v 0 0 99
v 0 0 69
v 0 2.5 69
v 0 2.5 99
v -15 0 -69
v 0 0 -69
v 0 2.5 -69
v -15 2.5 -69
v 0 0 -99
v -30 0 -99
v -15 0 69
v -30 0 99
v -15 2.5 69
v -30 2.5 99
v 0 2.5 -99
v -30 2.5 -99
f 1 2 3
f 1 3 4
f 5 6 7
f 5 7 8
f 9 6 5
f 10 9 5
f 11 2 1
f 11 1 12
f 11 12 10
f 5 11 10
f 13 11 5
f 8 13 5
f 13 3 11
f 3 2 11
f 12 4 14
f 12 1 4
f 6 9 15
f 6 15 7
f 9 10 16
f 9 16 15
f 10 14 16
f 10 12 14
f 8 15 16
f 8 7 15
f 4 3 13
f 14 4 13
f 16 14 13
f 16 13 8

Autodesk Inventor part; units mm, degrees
ref_plane "YZ Plane" through (0, 0, 0) normal (1, 0, 0) x (0, 1, 0)
ref_plane "XZ Plane" through (0, 0, 0) normal (0, 1, 0) x (-1, 0, 0)
ref_plane "XY Plane" through (0, 0, 0) normal (0, 0, 1) x (1, 0, 0)
sketch "スケッチ1" plane through (0, 0, 0) normal (0, 1, 0) x (-1, 0, 0)
  line L0 (0, 99) -> (30, 99)
  line L1 (30, 99) -> (30, -99)
  line L2 (30, -99) -> (0, -99)
  line L3 (0, -99) -> (0, 99)
  line L4 (0, -69) -> (15, -69)
  line L5 (15, -69) -> (15, 0)
  line L6 (36, 0) -> (-6, 0) projected
  line L7 (0, 69) -> (15, 69)
  line L8 (15, 69) -> (15, 0)
  point P0 (0, 0)
  point P1 (0, 0)
  dimension "d0" = 198
  dimension "d1" = 30
  dimension "d32" = 30
  dimension "d33" = 15
extrude "押し出し1" add sketch "スケッチ1" along normal blind 2.5 contours L0 L1 L6 L8 L7 L3 | L1 L2 L3 L4 L5 L6
properties part number "belt_rail" material "木材 (カエデ材)"
